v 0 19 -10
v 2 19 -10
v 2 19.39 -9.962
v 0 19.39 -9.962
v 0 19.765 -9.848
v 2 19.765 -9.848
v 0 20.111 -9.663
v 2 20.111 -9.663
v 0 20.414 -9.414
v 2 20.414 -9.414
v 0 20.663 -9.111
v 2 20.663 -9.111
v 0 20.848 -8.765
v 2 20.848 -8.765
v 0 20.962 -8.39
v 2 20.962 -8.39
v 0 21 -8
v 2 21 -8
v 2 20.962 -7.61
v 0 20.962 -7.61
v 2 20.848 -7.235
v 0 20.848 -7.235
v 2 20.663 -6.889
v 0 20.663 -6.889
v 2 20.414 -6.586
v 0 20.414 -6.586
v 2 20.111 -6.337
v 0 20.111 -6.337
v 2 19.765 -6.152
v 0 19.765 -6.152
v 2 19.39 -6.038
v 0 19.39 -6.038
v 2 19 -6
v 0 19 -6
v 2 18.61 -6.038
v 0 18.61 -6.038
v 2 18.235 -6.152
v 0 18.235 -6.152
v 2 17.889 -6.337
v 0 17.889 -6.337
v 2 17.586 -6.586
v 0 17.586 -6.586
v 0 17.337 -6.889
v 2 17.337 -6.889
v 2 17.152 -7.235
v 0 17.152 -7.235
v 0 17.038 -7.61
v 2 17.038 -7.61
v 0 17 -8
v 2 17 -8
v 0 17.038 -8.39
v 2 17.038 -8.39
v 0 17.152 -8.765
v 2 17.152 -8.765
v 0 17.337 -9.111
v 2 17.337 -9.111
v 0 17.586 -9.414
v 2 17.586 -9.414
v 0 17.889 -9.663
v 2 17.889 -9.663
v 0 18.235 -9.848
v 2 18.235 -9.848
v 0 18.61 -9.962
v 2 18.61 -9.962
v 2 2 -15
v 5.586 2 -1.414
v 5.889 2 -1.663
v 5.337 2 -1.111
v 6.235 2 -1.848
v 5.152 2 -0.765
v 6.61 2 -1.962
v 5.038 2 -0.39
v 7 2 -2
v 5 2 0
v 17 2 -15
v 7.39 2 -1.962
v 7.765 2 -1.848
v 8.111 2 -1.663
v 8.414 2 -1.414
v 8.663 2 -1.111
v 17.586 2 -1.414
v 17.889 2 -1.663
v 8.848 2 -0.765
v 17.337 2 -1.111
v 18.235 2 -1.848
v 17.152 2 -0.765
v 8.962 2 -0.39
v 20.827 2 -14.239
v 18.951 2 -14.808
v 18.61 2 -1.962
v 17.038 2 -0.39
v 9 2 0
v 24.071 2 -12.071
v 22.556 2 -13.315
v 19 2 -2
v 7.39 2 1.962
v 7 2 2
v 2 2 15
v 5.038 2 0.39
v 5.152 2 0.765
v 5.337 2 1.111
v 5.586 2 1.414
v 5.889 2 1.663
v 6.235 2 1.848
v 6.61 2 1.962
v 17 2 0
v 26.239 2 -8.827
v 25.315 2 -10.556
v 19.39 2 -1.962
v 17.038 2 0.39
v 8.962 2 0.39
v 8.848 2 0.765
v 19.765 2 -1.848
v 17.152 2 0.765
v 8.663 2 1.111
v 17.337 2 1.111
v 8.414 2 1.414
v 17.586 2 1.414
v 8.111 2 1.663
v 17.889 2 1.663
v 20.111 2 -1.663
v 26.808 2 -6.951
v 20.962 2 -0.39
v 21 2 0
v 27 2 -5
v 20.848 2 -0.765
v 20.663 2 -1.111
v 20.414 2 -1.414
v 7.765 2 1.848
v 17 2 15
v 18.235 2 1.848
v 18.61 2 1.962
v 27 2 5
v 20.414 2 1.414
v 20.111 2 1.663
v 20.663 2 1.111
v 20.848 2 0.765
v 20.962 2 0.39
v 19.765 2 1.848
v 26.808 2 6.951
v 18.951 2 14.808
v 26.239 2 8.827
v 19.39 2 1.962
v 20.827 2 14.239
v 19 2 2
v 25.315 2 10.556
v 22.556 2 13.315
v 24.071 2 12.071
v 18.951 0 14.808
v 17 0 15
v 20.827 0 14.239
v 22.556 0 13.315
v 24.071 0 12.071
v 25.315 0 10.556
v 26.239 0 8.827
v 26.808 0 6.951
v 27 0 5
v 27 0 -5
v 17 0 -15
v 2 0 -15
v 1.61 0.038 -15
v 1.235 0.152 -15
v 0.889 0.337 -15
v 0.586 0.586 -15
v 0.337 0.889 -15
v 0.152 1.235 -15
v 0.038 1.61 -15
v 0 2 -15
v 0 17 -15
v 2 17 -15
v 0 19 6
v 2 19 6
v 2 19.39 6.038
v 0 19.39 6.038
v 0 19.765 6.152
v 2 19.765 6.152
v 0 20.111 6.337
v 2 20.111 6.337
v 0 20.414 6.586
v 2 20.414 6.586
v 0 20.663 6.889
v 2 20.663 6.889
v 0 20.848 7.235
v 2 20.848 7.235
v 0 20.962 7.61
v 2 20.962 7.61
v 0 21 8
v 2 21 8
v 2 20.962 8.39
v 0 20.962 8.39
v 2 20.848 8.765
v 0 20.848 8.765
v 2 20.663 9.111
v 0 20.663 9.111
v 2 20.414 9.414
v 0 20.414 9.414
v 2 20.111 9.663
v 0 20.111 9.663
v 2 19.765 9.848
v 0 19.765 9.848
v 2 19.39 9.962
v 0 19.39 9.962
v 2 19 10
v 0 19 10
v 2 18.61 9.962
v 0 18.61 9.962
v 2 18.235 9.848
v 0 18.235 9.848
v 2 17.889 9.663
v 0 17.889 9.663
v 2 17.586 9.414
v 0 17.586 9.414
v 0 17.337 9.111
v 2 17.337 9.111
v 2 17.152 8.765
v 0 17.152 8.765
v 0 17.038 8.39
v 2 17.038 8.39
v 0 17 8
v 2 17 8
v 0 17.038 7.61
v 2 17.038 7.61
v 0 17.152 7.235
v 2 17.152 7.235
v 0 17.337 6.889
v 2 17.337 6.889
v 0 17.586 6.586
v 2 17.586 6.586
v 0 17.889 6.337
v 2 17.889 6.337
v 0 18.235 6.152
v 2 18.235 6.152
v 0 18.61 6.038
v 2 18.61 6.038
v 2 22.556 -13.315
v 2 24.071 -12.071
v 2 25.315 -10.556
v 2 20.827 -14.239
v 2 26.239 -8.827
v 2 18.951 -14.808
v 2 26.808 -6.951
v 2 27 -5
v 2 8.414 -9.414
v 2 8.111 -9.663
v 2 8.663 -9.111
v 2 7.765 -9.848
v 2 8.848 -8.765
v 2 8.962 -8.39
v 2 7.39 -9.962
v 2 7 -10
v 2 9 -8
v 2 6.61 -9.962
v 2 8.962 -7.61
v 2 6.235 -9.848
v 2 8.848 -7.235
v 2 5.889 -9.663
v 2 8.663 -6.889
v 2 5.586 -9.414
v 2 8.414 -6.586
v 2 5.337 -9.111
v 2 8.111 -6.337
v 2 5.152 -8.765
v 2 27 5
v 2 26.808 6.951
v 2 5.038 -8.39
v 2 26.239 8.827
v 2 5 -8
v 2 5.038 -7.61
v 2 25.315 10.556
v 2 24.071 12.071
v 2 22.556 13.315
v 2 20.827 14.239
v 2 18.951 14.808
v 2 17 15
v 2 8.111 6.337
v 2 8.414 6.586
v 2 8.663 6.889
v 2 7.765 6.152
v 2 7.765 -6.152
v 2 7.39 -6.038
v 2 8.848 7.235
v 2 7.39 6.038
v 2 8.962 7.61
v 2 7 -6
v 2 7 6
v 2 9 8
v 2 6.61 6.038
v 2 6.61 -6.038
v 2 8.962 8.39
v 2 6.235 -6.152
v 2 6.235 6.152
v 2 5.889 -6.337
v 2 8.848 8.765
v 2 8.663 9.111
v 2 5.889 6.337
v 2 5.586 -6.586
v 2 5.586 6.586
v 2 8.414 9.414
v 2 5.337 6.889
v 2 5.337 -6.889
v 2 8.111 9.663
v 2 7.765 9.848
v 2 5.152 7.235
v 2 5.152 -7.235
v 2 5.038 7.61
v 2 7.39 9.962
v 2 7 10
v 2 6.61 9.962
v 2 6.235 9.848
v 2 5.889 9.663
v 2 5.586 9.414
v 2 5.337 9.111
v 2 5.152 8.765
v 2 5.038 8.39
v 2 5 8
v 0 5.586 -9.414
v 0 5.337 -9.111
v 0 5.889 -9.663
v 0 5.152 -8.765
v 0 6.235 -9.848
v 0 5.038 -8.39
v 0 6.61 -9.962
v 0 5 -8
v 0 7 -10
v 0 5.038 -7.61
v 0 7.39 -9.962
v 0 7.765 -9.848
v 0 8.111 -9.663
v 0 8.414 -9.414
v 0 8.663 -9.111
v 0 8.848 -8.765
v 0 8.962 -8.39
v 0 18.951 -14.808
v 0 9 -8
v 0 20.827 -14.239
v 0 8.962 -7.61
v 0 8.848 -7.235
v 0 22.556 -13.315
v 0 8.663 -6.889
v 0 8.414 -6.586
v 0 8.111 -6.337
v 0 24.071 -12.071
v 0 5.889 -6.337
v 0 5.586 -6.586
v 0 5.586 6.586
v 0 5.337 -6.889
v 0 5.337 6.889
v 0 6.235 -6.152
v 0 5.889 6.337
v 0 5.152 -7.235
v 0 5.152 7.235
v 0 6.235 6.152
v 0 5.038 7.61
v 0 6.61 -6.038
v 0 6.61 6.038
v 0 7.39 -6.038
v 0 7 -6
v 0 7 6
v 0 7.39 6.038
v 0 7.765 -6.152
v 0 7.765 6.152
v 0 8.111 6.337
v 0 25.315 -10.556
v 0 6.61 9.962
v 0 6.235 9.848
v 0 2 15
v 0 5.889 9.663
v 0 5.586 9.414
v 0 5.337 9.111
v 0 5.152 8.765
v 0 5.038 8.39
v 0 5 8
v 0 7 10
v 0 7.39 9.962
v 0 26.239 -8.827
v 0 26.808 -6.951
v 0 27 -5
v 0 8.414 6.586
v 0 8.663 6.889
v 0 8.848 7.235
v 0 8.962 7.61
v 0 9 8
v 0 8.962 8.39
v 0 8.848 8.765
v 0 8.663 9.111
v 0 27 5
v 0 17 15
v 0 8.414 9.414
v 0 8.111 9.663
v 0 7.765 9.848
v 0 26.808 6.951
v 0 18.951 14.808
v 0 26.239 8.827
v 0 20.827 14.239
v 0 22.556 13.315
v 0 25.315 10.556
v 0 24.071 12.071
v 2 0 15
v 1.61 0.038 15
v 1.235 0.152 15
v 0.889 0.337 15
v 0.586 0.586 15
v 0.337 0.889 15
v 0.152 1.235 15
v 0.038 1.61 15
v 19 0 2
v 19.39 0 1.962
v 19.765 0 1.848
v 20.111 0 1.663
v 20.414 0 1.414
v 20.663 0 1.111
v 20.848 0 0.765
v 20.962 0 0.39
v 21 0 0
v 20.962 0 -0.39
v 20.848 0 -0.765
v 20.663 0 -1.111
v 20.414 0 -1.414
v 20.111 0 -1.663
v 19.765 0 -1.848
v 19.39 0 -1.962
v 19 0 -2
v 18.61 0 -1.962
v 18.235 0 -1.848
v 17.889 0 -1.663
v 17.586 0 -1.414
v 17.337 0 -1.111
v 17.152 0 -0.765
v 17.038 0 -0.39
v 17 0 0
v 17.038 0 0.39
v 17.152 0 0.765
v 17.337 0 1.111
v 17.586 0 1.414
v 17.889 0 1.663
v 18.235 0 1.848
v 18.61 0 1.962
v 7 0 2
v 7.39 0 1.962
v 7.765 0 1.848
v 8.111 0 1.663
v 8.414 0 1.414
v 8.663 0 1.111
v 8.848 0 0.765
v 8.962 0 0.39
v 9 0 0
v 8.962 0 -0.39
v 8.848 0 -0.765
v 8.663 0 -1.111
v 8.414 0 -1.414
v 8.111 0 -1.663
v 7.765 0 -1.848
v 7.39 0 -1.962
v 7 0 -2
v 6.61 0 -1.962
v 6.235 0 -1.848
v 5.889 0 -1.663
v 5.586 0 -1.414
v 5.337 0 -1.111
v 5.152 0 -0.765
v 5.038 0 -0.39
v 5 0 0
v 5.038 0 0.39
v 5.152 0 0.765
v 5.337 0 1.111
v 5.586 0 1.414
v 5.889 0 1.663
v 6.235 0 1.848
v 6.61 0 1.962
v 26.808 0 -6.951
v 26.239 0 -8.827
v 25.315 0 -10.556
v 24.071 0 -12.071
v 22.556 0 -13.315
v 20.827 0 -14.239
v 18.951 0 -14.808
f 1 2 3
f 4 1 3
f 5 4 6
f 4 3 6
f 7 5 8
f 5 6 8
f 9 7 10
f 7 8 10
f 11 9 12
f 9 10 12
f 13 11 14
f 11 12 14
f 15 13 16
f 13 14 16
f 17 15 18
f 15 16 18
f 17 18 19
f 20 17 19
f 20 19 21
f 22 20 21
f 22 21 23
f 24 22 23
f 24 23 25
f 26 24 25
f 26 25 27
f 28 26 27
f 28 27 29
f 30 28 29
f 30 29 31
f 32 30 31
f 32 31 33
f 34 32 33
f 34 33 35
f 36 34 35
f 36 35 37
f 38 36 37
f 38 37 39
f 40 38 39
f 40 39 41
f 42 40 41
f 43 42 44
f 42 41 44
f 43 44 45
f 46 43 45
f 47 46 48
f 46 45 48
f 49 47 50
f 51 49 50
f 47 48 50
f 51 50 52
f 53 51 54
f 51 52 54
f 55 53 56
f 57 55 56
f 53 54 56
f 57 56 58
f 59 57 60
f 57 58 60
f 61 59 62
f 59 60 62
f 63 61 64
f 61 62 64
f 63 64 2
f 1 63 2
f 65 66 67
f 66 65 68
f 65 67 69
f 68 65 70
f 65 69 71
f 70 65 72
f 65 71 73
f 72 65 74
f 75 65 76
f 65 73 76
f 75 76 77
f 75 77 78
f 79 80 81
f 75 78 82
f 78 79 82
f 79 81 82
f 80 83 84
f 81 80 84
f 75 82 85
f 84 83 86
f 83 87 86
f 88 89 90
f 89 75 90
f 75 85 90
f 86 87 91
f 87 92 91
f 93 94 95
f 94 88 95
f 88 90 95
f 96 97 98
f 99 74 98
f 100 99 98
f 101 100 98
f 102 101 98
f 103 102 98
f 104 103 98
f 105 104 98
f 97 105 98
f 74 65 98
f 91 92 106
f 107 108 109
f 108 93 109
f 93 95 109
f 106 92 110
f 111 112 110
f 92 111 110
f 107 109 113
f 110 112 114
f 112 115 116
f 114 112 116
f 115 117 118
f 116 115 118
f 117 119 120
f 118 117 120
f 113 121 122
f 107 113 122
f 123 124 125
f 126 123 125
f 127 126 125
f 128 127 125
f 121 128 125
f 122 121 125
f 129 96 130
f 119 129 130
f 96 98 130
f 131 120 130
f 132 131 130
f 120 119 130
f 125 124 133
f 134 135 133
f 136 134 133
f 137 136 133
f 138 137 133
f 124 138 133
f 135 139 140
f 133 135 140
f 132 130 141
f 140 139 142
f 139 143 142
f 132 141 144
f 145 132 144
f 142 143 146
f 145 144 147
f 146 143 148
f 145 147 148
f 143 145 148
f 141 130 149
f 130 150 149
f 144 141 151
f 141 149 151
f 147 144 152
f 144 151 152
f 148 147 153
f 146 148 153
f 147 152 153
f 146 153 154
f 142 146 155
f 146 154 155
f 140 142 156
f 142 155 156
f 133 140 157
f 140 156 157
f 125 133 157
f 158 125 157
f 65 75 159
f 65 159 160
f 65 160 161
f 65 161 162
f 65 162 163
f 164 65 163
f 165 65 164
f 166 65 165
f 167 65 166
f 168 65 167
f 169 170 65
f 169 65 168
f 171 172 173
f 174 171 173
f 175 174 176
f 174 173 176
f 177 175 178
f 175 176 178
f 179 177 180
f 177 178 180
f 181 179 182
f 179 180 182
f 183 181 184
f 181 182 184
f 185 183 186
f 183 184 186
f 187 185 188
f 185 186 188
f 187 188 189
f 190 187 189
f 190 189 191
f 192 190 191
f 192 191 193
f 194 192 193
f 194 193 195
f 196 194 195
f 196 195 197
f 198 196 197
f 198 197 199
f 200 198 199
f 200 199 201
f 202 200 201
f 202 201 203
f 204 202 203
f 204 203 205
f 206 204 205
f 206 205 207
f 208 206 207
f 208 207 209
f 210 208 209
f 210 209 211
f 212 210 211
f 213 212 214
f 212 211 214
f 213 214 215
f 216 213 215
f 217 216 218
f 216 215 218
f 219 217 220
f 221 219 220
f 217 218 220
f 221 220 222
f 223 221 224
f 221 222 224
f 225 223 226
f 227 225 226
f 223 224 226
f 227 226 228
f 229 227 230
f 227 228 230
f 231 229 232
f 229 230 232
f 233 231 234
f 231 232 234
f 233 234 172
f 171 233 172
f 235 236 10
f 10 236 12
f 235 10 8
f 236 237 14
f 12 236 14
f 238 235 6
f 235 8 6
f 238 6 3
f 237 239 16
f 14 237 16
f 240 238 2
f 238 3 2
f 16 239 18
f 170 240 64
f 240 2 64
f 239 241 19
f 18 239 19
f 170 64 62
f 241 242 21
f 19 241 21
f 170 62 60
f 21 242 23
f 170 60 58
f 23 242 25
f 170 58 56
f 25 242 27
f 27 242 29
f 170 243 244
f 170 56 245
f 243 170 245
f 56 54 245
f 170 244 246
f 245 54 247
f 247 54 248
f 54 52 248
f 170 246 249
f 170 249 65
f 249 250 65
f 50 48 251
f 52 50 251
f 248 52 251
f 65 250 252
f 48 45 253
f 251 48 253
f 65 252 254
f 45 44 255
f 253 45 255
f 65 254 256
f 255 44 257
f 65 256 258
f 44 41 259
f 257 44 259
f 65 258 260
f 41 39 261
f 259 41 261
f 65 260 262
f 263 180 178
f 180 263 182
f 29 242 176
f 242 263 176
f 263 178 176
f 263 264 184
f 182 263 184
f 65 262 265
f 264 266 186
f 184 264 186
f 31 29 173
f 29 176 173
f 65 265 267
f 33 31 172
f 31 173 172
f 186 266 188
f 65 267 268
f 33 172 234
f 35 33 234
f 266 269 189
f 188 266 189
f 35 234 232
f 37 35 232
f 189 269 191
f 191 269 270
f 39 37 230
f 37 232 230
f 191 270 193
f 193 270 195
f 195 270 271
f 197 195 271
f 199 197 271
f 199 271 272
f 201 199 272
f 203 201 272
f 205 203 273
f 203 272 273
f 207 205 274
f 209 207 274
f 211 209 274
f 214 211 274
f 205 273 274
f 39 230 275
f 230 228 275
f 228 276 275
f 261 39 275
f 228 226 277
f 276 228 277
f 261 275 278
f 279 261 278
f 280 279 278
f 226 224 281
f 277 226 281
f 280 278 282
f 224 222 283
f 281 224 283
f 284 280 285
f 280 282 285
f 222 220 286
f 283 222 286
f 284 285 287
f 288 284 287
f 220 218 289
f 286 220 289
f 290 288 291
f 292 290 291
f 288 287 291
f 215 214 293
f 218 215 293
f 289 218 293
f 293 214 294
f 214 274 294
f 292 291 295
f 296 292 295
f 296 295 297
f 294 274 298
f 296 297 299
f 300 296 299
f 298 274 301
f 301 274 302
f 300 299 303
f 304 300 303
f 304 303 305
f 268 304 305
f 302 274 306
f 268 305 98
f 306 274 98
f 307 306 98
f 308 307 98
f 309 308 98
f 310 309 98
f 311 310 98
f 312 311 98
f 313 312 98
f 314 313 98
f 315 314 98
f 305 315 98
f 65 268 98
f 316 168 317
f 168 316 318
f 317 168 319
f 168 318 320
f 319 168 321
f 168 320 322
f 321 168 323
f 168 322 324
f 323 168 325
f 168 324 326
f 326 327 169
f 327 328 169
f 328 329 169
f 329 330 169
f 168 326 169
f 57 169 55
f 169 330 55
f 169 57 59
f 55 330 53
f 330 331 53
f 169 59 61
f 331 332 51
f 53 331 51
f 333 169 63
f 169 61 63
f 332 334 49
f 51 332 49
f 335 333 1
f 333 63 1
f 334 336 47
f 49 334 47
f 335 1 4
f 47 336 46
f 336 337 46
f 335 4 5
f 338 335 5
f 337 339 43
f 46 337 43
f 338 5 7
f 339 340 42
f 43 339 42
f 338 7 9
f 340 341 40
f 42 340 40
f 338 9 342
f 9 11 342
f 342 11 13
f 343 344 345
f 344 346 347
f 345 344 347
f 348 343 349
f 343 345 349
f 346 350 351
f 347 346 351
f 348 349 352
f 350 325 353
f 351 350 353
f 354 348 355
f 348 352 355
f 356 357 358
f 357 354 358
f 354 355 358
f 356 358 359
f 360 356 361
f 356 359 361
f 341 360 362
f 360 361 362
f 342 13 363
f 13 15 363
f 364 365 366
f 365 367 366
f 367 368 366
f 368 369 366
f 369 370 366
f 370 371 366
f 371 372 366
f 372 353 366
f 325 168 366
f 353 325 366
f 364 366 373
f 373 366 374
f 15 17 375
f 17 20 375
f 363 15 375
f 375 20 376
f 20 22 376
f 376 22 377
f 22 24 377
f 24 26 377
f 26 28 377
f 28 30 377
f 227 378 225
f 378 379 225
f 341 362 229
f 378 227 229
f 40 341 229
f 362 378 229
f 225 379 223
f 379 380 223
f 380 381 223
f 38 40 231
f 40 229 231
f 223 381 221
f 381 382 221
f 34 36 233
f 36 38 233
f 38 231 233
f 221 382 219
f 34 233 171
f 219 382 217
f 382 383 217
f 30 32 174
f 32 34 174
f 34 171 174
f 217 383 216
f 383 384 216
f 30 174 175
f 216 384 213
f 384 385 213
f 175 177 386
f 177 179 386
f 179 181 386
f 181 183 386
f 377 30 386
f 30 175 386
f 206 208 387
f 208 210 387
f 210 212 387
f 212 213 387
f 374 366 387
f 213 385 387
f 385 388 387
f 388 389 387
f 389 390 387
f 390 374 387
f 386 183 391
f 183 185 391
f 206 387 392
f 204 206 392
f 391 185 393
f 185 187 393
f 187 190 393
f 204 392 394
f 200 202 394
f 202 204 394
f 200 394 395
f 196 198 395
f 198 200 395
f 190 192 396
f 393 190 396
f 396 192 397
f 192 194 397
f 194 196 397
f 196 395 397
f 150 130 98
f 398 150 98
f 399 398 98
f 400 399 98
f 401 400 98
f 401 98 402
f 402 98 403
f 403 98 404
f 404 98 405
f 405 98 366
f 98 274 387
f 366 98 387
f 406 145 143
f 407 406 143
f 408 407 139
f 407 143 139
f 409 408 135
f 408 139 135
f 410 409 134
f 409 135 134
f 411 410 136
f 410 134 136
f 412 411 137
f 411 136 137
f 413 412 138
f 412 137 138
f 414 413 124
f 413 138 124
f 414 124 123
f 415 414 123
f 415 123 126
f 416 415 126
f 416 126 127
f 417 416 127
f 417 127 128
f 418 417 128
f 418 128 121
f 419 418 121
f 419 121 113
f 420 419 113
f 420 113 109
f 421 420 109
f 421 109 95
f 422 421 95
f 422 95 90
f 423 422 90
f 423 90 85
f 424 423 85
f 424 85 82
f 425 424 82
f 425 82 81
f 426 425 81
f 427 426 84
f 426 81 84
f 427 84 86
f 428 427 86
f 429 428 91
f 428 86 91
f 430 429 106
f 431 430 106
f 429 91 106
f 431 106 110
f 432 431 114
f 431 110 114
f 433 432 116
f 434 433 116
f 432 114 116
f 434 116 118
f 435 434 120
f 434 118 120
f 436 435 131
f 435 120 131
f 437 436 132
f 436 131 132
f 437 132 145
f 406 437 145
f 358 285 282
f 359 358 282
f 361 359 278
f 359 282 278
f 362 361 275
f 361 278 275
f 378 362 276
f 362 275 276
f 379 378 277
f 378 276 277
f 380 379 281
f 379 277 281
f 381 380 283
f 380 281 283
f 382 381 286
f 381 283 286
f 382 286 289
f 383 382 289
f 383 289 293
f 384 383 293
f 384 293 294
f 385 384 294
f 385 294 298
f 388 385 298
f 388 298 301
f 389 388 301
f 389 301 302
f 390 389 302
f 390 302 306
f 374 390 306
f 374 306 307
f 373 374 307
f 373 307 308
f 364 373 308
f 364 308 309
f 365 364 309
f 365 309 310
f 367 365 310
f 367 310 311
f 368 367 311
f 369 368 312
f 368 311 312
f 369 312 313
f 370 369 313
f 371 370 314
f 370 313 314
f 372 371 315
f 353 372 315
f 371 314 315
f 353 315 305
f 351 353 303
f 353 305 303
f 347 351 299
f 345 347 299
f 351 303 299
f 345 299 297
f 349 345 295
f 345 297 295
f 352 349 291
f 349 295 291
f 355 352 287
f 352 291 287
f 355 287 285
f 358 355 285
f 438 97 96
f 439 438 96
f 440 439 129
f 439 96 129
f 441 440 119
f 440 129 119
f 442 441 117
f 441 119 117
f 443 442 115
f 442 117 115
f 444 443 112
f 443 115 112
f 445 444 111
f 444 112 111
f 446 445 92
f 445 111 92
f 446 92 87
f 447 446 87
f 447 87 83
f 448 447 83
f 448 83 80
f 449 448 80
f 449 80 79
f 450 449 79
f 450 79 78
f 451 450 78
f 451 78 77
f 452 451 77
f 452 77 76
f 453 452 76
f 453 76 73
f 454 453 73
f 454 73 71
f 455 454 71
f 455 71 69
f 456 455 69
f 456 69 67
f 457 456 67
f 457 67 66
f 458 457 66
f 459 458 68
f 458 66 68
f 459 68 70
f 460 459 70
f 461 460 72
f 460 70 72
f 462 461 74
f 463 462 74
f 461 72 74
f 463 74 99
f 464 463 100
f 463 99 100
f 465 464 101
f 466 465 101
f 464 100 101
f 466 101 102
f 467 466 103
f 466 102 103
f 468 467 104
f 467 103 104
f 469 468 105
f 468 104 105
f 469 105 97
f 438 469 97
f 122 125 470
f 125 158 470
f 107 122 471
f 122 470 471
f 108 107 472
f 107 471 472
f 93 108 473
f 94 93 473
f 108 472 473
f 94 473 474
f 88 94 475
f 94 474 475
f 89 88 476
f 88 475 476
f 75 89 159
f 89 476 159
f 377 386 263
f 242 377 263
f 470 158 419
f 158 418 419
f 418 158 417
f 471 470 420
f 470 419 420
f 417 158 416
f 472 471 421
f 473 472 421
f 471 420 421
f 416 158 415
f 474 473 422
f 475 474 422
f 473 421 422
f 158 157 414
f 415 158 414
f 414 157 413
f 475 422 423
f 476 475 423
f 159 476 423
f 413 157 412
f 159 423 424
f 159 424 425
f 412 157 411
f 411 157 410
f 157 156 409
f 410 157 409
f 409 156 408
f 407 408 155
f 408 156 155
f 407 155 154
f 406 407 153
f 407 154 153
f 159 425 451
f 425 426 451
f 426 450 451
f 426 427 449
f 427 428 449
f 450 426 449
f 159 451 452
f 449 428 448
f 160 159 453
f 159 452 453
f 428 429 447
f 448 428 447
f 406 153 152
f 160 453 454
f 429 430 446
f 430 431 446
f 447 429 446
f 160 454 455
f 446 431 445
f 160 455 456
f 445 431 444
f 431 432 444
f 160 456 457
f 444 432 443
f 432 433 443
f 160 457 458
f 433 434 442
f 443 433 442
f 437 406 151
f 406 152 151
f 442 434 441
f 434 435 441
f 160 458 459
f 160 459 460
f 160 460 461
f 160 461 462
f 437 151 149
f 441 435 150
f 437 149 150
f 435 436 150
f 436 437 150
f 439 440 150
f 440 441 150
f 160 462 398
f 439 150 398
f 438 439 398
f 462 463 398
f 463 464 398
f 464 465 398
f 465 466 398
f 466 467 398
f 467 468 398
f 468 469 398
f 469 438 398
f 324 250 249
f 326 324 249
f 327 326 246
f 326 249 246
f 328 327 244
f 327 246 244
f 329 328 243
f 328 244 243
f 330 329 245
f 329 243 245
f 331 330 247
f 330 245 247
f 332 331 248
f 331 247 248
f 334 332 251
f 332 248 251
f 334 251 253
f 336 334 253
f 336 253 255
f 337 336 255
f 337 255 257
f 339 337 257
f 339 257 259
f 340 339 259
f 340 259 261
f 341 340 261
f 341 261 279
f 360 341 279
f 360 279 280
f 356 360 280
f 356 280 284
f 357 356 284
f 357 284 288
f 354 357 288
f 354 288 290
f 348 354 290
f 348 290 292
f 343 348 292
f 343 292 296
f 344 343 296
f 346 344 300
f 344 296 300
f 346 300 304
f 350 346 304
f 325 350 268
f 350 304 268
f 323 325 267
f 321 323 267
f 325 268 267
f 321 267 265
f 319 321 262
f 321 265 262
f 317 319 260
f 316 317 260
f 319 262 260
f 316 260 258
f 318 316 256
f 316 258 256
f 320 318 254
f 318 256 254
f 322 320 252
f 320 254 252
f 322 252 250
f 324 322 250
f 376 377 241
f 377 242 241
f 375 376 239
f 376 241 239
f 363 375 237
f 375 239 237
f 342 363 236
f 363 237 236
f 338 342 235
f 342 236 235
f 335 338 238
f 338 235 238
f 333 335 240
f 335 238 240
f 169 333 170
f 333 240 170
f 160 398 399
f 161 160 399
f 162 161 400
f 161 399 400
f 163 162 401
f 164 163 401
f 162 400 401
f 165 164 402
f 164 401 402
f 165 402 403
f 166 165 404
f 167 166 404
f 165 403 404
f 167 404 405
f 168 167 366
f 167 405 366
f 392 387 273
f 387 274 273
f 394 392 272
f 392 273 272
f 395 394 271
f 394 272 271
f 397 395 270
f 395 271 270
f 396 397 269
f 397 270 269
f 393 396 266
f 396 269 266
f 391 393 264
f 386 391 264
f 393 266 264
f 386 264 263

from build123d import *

# Parameters (mm, degrees)
BOSS_EXTRU_1_DEPTH = 15
CONG_1_R           = 10
SKETCH4_R          = 2
CUT_EXTRUDE3_DEPTH = 10
SKETCH5_R          = 2
CUT_EXTRUDE4_DEPTH = 10


with BuildPart() as part:
    # Esquisse1 → Boss.-Extru.1 (new, symmetric)
    with BuildSketch(Plane.XY):
        with BuildLine():
            Line((0, 2), (0, 27))
            Line((0, 27), (2, 27))
            Line((2, 27), (2, 2))
            Line((2, 2), (27, 2))
            Line((27, 2), (27, 0))
            Line((27, 0), (2, 0))
            ThreePointArc((2, 0), (0.585786438, 0.585786438), (0, 2))
        make_face()
    extrude(amount=BOSS_EXTRU_1_DEPTH, both=True)

    # Congé1
    cong_1_edges = [part.edges().sort_by_distance(p)[0] for p in [
        (27, 1, 15),
        (1, 27, 15),
        (27, 1, -15),
        (1, 27, -15),
    ]]
    fillet(cong_1_edges, radius=CONG_1_R)

    # Sketch4 → Cut-Extrude3 (cut)
    with BuildSketch(Plane(origin=(0, 2, 0), x_dir=(1, 0, 0), z_dir=(0, 1, 0))):
        with Locations(Location((7, 0, 0), (0, 0, 270))):
            Circle(SKETCH4_R)
        with Locations(Location((19, 0, 0), (0, 0, 270))):
            Circle(SKETCH4_R)
    extrude(amount=-CUT_EXTRUDE3_DEPTH, mode=Mode.SUBTRACT)

    # Sketch5 → Cut-Extrude4 (cut)
    with BuildSketch(Plane(origin=(2, 0, 0), x_dir=(0, 0, -1), z_dir=(1, 0, 0))):
        with Locations((-8, 19)):
            Circle(SKETCH5_R)
        with Locations((8, 19)):
            Circle(SKETCH5_R)
        with Locations((8, 7)):
            Circle(SKETCH5_R)
        with Locations((-8, 7)):
            Circle(SKETCH5_R)
    extrude(amount=-CUT_EXTRUDE4_DEPTH, mode=Mode.SUBTRACT)


solid = part.part
